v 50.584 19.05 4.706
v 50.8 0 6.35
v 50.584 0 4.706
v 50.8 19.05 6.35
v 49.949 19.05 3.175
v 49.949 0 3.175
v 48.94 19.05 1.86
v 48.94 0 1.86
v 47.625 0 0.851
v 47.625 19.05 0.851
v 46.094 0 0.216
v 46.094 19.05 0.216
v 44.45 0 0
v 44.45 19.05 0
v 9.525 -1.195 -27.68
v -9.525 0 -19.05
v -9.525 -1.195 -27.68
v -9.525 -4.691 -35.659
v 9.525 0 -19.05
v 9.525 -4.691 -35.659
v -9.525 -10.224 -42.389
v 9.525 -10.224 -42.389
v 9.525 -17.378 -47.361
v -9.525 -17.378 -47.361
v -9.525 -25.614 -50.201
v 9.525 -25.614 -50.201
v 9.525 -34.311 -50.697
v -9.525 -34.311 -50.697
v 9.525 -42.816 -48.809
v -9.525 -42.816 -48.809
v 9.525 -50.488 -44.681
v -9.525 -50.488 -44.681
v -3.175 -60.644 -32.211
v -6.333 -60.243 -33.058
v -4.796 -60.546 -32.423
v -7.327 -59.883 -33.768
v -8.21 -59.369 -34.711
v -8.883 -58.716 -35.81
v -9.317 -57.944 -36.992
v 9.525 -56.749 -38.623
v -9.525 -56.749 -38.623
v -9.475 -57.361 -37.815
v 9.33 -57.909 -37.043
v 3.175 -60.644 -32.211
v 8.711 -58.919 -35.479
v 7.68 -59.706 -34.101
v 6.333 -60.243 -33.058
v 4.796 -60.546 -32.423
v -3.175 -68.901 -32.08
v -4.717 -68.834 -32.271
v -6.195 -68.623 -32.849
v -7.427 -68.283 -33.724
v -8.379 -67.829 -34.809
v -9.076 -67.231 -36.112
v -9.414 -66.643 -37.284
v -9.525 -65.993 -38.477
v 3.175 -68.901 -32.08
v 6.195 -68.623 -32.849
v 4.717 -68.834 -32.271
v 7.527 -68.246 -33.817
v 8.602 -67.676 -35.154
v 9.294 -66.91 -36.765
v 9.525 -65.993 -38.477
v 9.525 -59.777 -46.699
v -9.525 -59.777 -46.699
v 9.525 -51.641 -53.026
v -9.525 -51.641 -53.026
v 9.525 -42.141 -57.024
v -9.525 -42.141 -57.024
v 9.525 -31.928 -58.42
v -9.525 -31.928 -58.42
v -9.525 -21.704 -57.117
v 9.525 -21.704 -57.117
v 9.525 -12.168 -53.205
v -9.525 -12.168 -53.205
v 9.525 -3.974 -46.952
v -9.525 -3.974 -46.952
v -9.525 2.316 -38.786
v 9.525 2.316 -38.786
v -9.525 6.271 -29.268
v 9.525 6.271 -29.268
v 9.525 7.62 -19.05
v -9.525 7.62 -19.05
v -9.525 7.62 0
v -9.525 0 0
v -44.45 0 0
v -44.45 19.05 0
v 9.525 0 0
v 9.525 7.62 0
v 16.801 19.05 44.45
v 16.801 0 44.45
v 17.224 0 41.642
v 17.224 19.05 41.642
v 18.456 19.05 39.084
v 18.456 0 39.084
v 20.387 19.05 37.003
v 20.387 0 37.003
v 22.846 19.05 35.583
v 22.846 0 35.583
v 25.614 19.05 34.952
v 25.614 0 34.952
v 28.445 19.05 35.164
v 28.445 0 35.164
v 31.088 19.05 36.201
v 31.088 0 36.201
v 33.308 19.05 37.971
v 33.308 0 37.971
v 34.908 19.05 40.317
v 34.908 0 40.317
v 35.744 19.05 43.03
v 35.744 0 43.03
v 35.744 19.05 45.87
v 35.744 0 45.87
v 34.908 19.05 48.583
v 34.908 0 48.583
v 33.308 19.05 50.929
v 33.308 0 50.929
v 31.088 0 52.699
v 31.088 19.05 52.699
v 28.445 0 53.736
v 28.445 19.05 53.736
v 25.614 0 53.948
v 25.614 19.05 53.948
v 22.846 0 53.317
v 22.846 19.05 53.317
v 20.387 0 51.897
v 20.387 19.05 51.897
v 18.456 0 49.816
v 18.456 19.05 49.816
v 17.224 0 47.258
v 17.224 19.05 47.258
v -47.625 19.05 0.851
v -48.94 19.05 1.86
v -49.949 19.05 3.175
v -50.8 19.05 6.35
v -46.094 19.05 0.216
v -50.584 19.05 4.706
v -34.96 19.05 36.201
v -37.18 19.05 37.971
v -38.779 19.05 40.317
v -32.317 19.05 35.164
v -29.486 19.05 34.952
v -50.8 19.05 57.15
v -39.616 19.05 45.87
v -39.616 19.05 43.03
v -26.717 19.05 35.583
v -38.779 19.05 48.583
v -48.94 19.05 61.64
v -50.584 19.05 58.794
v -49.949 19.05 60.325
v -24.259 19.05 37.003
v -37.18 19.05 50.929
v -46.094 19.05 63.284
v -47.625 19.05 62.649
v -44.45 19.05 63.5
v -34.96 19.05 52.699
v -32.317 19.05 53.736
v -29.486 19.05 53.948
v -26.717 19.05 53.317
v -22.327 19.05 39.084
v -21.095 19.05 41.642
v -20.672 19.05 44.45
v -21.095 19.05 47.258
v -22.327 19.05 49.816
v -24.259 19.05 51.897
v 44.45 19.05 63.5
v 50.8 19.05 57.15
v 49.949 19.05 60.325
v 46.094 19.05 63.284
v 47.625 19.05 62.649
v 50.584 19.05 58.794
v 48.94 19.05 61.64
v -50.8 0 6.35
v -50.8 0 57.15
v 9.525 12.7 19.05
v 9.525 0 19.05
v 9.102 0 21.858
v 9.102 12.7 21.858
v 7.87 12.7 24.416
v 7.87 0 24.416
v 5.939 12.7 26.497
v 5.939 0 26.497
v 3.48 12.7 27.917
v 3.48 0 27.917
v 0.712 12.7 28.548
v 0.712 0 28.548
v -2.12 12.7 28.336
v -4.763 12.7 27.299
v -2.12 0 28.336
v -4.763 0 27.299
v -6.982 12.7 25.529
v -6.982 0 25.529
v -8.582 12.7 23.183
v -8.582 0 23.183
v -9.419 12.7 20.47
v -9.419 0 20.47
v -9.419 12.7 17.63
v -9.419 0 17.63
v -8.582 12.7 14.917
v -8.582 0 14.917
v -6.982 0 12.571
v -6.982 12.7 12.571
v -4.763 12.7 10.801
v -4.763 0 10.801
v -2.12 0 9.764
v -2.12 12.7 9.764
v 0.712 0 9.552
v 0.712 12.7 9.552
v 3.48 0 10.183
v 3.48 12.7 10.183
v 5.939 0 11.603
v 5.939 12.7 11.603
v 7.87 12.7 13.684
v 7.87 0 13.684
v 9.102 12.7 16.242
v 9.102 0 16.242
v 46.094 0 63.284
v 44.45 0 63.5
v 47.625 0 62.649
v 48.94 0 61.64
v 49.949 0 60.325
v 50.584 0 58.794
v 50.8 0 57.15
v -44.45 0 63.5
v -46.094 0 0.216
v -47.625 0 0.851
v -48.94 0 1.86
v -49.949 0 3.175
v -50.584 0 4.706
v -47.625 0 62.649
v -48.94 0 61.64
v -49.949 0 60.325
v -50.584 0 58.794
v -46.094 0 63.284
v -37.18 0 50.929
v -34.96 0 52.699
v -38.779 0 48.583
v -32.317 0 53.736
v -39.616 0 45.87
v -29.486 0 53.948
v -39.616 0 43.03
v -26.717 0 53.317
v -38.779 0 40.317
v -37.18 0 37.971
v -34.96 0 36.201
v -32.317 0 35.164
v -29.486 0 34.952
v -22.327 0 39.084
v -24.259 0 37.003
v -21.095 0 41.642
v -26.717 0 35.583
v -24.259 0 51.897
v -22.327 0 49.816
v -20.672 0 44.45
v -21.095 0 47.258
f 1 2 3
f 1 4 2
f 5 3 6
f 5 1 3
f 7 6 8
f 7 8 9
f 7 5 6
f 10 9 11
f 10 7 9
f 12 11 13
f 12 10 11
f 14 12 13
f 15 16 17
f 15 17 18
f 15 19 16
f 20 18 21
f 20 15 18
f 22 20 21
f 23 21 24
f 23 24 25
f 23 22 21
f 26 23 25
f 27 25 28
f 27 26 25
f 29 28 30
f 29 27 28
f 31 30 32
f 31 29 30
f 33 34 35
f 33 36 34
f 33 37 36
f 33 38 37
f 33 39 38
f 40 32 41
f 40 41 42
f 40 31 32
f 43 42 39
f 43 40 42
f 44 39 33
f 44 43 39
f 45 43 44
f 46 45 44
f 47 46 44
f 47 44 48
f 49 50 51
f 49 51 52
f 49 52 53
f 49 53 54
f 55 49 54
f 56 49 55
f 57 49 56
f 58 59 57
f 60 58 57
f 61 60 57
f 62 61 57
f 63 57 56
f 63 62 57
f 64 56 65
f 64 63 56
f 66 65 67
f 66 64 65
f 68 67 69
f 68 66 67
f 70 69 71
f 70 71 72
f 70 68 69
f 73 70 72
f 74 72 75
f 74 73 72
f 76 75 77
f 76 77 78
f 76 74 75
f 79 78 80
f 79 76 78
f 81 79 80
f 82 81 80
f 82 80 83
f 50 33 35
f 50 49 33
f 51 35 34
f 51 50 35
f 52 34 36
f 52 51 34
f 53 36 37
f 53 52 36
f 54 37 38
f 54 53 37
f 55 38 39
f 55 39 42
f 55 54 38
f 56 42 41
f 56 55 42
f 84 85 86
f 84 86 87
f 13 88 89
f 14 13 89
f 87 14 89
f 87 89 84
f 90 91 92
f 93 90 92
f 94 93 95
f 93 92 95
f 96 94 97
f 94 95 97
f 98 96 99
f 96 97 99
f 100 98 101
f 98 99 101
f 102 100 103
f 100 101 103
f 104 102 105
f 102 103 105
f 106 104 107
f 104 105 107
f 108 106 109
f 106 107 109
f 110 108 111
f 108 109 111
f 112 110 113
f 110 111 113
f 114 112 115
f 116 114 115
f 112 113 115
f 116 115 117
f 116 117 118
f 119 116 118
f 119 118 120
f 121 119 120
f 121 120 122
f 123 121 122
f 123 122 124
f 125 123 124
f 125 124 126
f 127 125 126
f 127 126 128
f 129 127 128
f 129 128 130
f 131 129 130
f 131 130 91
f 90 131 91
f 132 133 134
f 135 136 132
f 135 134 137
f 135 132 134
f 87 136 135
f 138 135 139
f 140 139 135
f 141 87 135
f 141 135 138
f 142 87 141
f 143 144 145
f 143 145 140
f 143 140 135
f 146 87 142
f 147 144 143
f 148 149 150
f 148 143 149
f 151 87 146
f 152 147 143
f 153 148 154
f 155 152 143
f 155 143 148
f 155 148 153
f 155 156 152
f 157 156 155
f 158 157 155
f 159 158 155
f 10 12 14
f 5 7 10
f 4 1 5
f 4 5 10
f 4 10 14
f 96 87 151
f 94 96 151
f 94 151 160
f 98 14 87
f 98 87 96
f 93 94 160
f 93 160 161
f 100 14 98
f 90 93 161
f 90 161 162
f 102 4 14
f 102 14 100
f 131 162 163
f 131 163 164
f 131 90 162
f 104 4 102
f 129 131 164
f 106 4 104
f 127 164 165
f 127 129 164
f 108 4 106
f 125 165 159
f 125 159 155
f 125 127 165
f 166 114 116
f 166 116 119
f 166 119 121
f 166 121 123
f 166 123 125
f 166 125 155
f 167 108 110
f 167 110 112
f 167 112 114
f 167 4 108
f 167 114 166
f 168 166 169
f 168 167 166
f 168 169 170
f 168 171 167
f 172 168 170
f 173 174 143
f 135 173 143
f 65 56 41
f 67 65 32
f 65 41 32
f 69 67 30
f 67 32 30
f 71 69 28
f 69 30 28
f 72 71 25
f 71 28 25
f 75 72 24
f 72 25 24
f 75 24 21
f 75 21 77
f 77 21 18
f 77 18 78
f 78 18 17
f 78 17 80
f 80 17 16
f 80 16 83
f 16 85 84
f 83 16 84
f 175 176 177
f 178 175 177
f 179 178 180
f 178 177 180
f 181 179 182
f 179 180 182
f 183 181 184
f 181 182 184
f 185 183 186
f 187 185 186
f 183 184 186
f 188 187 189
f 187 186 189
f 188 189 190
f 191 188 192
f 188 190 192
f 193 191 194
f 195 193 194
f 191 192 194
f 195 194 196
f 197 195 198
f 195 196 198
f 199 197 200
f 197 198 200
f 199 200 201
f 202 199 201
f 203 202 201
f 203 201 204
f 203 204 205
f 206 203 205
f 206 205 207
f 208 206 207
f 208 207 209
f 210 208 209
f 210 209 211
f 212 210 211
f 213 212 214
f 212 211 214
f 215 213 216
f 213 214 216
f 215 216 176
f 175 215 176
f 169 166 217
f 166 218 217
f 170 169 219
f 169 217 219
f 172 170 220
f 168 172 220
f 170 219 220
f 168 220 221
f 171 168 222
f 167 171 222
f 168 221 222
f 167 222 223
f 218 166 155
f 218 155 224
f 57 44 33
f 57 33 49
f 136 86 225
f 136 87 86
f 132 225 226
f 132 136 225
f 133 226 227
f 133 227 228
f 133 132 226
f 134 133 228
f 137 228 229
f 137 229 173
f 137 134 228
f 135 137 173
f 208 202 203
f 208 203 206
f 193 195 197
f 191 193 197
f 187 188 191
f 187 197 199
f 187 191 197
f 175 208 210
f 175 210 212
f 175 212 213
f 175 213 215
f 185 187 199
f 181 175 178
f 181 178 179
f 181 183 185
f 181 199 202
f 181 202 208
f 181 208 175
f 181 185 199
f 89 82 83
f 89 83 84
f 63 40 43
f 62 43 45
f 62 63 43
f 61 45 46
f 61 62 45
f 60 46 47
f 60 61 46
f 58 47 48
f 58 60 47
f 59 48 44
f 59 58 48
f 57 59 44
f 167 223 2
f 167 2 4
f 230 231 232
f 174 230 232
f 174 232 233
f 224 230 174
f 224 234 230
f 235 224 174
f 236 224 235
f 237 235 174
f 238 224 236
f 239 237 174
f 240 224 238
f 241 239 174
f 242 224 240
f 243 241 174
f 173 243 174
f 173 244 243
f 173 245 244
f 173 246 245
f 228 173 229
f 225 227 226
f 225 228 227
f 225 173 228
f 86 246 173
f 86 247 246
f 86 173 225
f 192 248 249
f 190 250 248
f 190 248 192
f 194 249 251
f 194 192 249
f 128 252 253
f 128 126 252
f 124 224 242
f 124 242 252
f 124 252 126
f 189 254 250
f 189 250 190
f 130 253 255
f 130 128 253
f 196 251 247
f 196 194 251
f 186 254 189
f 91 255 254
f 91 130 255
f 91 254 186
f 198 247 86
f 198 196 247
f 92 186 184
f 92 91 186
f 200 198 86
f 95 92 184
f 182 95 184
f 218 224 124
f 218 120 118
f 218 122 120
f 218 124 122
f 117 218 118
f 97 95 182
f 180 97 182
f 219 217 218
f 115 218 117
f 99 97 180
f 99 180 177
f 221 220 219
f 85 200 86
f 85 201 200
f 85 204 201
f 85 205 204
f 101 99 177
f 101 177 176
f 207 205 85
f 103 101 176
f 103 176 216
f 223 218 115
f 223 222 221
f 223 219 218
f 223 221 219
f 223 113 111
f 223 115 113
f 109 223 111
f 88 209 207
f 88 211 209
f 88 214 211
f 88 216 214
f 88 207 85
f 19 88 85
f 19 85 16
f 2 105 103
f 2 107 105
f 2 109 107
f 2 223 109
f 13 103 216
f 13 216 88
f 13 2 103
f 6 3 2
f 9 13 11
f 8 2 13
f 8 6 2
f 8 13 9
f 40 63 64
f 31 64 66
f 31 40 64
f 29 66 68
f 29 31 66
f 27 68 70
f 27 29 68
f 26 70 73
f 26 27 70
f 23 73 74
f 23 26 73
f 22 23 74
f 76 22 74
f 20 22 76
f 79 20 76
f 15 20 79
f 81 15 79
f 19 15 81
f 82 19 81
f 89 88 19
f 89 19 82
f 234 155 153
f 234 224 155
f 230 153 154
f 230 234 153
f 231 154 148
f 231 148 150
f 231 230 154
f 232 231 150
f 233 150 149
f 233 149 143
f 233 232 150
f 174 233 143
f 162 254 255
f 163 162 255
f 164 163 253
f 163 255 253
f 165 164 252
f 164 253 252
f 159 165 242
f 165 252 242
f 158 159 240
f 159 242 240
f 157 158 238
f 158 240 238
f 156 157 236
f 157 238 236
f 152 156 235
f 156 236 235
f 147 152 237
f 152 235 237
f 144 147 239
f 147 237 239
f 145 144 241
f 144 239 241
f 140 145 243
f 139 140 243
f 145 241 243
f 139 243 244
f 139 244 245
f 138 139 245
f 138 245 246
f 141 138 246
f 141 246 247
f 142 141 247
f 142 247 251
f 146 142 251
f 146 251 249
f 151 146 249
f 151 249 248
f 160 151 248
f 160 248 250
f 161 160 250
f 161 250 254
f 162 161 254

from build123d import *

# Parameters (mm, degrees)
F1_DEPTH = 50.8
F0_W     = 7.62
F0_H     = 19.05
F2_DEPTH = 9.525
F3_R     = 6.35
F4_R     = 9.525
F5_DEPTH = 25.4
F6_DEPTH = 12.7


with BuildPart() as f1:
    # F0 (on Right) → F1 (new body, symmetric)
    with BuildSketch(Plane.YZ):
        Polygon((0, 63.5), (0, 0), (7.62, 0), (19.05, 0), (19.05, 63.5), align=None)
    extrude(amount=F1_DEPTH, both=True)

    # F0 (on Right) → F2 (join, symmetric)
    with BuildSketch(Plane.YZ):
        Polygon((0, 63.5), (0, 0), (7.62, 0), (19.05, 0), (19.05, 63.5), align=None)
        with Locations((3.81, -9.525)):
            Rectangle(F0_W, F0_H)
        with BuildLine():
            Line((7.62, -19.05), (0, -19.05))
            ThreePointArc((0, -19.05), (-25.016468, -50.077762), (-60.643908, -32.21072))
            Line((-60.643908, -32.21072), (-68.901188, -32.0802))
            ThreePointArc((-68.901188, -32.0802), (-25.141119, -57.861333), (7.62, -19.05))
        make_face()
    extrude(amount=F2_DEPTH, both=True)

    # F3
    f3_edges = [f1.edges().sort_by_distance(p)[0] for p in [
        (9.525, -64.772548, -32.14546),
        (-9.525, -64.772548, -32.14546),
        (50.8, 9.525, 0),
        (50.8, 9.525, 63.5),
        (-50.8, 9.525, 63.5),
        (-50.8, 9.525, 0),
    ]]
    fillet(f3_edges, radius=F3_R)

    # F4 (on face) → F5 (cut)
    with BuildSketch(Plane.XZ):
        with Locations((-30.197322, 44.45)):
            Circle(F4_R)
        with BuildLine():
            ThreePointArc((35.850874, 44.45), (26.325874, 53.975), (16.800874, 44.45))
            ThreePointArc((16.800874, 44.45), (26.325874, 34.925), (35.850874, 44.45))
        make_face()
    extrude(amount=-F5_DEPTH, mode=Mode.SUBTRACT)

    # F4 (on face) → F6 (cut)
    with BuildSketch(Plane.XZ):
        with Locations((-30.197322, 44.45)):
            Circle(F4_R)
        with BuildLine():
            ThreePointArc((35.850874, 44.45), (26.325874, 53.975), (16.800874, 44.45))
            ThreePointArc((16.800874, 44.45), (26.325874, 34.925), (35.850874, 44.45))
        make_face()
        with Locations((0, 19.05)):
            Circle(F4_R)
    extrude(amount=-F6_DEPTH, mode=Mode.SUBTRACT)


solid = f1.part
